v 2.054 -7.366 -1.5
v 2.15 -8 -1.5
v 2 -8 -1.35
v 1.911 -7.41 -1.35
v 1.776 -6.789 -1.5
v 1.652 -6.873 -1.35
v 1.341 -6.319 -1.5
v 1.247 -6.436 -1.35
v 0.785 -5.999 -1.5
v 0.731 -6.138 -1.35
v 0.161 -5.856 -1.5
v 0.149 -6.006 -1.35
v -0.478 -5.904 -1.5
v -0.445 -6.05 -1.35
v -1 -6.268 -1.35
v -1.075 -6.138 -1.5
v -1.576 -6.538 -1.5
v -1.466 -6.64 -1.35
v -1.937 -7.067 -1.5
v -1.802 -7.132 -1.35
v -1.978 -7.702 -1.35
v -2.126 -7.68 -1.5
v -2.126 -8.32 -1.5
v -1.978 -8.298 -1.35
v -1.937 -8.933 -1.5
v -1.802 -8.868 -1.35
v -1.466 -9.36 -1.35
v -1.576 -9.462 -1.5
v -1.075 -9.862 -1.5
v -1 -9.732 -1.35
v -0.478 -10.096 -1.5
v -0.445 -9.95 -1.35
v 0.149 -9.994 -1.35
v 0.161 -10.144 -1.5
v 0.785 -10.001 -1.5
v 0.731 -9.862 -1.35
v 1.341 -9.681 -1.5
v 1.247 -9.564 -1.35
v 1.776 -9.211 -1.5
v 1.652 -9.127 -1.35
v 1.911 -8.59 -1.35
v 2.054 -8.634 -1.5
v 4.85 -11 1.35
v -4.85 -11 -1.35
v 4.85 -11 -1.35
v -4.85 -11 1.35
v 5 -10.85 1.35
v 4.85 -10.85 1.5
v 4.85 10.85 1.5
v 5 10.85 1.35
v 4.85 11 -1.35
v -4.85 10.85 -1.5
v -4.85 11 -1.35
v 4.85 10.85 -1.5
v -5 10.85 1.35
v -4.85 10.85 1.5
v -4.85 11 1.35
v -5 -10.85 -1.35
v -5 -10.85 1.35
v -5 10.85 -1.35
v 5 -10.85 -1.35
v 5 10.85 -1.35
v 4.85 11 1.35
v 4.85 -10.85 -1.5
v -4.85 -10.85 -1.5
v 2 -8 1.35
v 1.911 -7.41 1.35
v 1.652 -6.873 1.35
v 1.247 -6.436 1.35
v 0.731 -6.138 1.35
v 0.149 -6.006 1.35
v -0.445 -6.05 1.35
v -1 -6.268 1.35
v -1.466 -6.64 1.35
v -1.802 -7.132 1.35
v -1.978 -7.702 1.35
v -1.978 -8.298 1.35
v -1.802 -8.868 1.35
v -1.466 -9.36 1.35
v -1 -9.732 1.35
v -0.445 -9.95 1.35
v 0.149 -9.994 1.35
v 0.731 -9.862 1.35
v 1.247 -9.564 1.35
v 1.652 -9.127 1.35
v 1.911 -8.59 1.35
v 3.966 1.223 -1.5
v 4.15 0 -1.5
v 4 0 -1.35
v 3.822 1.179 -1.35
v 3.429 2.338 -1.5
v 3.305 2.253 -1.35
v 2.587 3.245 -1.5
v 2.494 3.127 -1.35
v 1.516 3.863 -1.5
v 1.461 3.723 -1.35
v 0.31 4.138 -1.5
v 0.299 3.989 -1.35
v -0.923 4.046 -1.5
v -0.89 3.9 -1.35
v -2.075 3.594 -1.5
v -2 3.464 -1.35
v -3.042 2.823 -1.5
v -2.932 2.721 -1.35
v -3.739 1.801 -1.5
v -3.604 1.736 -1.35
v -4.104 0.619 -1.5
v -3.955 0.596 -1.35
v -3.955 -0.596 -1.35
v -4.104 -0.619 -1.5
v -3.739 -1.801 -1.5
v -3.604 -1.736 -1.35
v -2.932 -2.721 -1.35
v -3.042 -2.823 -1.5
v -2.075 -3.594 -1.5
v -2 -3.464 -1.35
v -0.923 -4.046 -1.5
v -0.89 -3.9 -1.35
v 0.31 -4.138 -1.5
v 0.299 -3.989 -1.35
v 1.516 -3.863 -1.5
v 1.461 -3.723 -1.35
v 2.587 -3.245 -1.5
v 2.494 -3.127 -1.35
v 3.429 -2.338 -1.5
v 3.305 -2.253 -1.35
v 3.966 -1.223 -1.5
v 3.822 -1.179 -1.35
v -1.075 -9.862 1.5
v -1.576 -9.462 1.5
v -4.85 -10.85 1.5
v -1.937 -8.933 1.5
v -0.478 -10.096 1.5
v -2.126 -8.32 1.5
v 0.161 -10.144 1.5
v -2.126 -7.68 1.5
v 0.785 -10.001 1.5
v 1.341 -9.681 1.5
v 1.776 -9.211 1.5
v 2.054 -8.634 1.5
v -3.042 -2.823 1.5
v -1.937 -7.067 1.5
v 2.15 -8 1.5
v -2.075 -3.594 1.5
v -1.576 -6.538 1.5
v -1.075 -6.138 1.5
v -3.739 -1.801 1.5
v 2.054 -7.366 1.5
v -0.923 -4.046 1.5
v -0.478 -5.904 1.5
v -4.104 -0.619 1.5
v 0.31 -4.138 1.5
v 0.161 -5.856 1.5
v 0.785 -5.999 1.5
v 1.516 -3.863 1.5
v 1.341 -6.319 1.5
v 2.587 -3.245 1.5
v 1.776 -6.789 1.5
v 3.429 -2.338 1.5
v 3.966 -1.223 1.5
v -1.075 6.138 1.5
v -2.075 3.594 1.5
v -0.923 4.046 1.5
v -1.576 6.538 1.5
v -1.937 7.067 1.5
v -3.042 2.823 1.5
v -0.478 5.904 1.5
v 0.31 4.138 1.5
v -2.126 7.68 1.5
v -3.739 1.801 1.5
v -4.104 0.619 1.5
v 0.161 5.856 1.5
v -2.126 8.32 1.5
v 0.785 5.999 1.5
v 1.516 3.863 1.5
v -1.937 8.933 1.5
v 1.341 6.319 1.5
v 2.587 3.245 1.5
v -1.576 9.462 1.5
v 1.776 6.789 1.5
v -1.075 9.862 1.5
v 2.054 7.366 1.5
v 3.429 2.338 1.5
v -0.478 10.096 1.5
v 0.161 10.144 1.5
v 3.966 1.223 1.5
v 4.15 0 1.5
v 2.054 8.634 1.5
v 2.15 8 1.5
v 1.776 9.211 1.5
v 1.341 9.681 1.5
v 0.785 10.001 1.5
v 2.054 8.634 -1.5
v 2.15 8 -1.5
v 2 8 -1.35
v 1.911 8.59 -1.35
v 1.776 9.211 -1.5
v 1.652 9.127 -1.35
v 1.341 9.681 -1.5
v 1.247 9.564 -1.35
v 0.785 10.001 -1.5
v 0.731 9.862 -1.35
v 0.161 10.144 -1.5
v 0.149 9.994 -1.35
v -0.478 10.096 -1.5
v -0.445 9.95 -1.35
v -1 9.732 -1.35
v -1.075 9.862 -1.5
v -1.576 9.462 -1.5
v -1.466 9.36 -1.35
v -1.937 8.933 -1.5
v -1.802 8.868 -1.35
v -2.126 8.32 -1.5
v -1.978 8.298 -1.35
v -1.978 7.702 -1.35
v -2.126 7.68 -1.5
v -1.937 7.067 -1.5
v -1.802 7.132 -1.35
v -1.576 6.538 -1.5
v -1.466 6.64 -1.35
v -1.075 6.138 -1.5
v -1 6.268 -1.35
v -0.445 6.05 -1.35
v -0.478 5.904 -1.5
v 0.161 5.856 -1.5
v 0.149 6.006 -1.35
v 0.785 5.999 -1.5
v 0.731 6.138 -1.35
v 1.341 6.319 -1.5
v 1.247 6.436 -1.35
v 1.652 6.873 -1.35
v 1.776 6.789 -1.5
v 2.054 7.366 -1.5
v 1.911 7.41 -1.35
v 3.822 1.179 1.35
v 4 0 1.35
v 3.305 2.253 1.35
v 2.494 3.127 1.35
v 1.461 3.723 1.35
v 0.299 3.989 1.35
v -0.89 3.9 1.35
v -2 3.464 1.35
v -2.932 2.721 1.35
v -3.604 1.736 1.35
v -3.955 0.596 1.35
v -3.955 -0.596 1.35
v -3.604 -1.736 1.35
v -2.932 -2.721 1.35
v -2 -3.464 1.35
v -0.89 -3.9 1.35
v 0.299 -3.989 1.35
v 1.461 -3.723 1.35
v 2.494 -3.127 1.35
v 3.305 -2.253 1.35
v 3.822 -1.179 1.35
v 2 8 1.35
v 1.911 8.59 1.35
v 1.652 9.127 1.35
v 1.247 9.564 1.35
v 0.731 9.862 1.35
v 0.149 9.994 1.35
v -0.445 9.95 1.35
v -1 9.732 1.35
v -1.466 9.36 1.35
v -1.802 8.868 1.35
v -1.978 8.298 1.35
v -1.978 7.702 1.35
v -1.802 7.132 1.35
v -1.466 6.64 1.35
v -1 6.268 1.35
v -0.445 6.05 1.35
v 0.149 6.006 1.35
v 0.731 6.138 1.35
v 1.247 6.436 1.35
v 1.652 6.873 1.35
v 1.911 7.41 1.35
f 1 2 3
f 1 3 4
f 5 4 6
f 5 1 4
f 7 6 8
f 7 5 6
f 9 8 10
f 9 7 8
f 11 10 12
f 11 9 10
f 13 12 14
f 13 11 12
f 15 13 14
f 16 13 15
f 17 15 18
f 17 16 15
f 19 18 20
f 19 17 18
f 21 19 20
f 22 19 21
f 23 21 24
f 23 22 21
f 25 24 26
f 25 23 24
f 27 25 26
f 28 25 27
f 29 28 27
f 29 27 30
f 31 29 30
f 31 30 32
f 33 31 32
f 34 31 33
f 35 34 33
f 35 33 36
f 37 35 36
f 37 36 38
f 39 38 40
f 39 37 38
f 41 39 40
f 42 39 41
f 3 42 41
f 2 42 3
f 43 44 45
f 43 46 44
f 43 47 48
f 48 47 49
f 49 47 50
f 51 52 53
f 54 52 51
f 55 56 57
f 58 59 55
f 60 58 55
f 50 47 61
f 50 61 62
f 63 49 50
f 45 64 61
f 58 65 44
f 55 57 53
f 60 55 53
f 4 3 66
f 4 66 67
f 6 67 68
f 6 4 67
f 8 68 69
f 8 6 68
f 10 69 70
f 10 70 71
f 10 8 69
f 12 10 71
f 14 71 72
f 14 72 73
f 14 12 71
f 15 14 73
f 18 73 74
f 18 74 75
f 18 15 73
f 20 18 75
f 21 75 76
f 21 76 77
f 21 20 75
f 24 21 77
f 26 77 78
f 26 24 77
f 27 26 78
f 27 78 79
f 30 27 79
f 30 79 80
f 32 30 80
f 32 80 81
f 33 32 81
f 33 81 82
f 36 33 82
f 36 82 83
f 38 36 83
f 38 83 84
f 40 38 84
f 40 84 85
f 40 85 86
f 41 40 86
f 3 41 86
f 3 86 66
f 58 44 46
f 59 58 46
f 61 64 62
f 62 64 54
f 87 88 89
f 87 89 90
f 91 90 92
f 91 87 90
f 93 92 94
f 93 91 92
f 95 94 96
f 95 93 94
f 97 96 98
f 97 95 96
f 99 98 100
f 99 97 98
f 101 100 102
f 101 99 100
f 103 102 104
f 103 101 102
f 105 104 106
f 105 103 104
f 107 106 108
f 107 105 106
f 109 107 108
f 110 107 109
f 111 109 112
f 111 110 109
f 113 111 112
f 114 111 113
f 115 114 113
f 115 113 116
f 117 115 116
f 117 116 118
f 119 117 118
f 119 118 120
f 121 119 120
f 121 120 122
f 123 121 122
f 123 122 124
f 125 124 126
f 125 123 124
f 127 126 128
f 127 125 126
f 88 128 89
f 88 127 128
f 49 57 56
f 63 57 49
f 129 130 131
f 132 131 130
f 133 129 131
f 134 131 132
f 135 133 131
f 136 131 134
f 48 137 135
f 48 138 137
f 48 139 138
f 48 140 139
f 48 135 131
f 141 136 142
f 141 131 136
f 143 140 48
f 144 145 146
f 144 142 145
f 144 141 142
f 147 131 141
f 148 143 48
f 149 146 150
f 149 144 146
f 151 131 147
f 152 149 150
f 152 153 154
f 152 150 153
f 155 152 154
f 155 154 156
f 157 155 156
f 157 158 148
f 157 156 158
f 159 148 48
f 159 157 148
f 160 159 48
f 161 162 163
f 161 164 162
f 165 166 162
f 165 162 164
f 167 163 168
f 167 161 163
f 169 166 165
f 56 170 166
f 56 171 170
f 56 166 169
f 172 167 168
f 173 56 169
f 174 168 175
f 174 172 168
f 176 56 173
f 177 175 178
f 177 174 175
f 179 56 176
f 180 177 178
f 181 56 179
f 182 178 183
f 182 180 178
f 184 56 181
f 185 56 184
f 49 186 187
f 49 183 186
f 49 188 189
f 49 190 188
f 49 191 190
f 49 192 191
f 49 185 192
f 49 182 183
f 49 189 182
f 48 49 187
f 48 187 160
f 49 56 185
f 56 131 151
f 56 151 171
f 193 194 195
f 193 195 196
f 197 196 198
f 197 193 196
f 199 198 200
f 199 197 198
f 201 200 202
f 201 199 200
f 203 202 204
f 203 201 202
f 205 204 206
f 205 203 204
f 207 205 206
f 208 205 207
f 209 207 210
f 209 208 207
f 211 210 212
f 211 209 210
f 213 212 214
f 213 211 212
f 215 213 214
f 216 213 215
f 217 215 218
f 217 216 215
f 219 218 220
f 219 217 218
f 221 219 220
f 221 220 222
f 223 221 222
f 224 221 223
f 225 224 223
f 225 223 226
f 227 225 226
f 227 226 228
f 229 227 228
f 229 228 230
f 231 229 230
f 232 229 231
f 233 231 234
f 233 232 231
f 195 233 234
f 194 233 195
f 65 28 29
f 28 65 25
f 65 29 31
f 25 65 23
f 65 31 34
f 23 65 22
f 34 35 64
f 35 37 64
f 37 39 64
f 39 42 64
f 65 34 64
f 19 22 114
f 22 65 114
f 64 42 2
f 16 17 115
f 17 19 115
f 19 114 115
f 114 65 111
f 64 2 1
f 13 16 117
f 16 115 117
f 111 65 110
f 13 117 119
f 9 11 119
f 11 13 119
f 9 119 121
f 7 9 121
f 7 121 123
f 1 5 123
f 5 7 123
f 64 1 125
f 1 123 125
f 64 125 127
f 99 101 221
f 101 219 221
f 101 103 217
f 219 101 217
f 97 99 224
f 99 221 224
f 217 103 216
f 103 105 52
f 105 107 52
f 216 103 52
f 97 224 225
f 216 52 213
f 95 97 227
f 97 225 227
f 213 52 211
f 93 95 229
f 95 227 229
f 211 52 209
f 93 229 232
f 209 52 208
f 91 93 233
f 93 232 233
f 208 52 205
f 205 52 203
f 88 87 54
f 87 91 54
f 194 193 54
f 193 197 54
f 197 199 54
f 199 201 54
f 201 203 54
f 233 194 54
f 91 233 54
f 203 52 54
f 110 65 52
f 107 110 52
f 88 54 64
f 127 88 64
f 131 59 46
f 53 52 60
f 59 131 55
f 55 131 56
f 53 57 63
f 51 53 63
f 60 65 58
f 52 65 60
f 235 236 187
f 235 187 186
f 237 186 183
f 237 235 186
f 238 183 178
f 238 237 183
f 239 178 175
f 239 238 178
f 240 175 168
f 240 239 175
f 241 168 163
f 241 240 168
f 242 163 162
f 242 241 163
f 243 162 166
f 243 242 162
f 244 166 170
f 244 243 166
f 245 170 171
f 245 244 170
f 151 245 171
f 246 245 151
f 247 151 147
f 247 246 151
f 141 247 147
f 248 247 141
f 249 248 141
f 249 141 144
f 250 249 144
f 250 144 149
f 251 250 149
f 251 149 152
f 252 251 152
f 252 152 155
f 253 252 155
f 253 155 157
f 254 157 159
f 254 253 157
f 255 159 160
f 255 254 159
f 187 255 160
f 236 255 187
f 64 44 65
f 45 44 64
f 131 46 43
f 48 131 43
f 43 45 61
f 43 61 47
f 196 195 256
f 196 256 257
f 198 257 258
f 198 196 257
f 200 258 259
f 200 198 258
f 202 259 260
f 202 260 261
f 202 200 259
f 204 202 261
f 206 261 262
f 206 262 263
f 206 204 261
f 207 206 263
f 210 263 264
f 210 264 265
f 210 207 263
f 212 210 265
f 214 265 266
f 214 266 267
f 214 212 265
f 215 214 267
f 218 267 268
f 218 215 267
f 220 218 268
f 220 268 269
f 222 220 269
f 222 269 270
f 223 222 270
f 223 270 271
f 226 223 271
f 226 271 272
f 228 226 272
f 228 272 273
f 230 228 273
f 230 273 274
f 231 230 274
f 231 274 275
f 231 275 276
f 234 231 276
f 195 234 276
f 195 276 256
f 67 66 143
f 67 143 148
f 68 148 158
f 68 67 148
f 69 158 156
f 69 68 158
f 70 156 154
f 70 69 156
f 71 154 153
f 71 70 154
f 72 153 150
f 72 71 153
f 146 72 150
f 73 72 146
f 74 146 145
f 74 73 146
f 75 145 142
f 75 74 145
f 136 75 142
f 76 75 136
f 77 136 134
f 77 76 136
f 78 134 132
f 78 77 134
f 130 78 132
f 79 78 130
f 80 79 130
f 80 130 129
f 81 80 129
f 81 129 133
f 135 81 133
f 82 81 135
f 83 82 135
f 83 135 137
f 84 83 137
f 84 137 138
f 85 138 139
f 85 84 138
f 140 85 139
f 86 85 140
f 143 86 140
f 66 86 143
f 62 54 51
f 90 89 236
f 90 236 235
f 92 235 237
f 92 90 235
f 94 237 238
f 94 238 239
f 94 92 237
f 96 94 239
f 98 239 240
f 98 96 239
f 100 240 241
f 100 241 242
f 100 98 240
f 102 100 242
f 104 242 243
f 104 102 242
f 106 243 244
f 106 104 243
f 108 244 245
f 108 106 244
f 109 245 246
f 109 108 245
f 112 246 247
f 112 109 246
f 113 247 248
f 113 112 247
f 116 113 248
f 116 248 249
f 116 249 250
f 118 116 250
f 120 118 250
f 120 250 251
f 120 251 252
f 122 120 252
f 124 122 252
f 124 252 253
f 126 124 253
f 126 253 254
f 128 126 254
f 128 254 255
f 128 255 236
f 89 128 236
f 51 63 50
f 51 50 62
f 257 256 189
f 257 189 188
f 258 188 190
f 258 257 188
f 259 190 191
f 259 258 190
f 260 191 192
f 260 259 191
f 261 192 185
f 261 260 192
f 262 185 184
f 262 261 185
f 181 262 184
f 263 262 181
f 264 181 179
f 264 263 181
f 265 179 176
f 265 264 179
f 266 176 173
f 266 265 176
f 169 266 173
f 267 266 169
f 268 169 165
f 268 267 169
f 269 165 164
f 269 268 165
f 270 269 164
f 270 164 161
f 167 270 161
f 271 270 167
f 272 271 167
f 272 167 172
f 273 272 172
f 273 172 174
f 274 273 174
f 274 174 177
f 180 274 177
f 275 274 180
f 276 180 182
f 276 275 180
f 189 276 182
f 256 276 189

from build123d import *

# Parameters (mm, degrees)
SKETCH1_W           = 10
SKETCH1_H           = 22
SKETCH1_R           = 4
SKETCH1_R_2         = 2
BOSS_EXTRUDE1_DEPTH = 1.5
CHAMFER1_SIZE       = 0.15


with BuildPart() as part:
    # Sketch1 → Boss-Extrude1 (new, symmetric)
    with BuildSketch(Plane.XY):
        Rectangle(SKETCH1_W, SKETCH1_H)
        Circle(SKETCH1_R, mode=Mode.SUBTRACT)
        with Locations((0, -8)):
            Circle(SKETCH1_R_2, mode=Mode.SUBTRACT)
        with Locations((0, 8)):
            Circle(SKETCH1_R_2, mode=Mode.SUBTRACT)
    extrude(amount=BOSS_EXTRUDE1_DEPTH, both=True)

    # Chamfer1
    chamfer1_edges = [part.edges().sort_by_distance(p)[0] for p in [
        (-4, 0, -1.5),
        (-4, 0, 1.5),
        (5, 0, 1.5),
        (-2, -8, -1.5),
        (-2, -8, 1.5),
        (0, 11, 1.5),
        (-2, 8, -1.5),
        (-2, 8, 1.5),
        (-5, 0, 1.5),
        (0, 11, -1.5),
        (5, 0, -1.5),
        (0, -11, -1.5),
        (-5, 0, -1.5),
        (-5, 11, 0),
        (5, 11, 0),
        (5, -11, 0),
        (-5, -11, 0),
        (0, -11, 1.5),
    ]]
    chamfer(chamfer1_edges, length=CHAMFER1_SIZE)


solid = part.part
